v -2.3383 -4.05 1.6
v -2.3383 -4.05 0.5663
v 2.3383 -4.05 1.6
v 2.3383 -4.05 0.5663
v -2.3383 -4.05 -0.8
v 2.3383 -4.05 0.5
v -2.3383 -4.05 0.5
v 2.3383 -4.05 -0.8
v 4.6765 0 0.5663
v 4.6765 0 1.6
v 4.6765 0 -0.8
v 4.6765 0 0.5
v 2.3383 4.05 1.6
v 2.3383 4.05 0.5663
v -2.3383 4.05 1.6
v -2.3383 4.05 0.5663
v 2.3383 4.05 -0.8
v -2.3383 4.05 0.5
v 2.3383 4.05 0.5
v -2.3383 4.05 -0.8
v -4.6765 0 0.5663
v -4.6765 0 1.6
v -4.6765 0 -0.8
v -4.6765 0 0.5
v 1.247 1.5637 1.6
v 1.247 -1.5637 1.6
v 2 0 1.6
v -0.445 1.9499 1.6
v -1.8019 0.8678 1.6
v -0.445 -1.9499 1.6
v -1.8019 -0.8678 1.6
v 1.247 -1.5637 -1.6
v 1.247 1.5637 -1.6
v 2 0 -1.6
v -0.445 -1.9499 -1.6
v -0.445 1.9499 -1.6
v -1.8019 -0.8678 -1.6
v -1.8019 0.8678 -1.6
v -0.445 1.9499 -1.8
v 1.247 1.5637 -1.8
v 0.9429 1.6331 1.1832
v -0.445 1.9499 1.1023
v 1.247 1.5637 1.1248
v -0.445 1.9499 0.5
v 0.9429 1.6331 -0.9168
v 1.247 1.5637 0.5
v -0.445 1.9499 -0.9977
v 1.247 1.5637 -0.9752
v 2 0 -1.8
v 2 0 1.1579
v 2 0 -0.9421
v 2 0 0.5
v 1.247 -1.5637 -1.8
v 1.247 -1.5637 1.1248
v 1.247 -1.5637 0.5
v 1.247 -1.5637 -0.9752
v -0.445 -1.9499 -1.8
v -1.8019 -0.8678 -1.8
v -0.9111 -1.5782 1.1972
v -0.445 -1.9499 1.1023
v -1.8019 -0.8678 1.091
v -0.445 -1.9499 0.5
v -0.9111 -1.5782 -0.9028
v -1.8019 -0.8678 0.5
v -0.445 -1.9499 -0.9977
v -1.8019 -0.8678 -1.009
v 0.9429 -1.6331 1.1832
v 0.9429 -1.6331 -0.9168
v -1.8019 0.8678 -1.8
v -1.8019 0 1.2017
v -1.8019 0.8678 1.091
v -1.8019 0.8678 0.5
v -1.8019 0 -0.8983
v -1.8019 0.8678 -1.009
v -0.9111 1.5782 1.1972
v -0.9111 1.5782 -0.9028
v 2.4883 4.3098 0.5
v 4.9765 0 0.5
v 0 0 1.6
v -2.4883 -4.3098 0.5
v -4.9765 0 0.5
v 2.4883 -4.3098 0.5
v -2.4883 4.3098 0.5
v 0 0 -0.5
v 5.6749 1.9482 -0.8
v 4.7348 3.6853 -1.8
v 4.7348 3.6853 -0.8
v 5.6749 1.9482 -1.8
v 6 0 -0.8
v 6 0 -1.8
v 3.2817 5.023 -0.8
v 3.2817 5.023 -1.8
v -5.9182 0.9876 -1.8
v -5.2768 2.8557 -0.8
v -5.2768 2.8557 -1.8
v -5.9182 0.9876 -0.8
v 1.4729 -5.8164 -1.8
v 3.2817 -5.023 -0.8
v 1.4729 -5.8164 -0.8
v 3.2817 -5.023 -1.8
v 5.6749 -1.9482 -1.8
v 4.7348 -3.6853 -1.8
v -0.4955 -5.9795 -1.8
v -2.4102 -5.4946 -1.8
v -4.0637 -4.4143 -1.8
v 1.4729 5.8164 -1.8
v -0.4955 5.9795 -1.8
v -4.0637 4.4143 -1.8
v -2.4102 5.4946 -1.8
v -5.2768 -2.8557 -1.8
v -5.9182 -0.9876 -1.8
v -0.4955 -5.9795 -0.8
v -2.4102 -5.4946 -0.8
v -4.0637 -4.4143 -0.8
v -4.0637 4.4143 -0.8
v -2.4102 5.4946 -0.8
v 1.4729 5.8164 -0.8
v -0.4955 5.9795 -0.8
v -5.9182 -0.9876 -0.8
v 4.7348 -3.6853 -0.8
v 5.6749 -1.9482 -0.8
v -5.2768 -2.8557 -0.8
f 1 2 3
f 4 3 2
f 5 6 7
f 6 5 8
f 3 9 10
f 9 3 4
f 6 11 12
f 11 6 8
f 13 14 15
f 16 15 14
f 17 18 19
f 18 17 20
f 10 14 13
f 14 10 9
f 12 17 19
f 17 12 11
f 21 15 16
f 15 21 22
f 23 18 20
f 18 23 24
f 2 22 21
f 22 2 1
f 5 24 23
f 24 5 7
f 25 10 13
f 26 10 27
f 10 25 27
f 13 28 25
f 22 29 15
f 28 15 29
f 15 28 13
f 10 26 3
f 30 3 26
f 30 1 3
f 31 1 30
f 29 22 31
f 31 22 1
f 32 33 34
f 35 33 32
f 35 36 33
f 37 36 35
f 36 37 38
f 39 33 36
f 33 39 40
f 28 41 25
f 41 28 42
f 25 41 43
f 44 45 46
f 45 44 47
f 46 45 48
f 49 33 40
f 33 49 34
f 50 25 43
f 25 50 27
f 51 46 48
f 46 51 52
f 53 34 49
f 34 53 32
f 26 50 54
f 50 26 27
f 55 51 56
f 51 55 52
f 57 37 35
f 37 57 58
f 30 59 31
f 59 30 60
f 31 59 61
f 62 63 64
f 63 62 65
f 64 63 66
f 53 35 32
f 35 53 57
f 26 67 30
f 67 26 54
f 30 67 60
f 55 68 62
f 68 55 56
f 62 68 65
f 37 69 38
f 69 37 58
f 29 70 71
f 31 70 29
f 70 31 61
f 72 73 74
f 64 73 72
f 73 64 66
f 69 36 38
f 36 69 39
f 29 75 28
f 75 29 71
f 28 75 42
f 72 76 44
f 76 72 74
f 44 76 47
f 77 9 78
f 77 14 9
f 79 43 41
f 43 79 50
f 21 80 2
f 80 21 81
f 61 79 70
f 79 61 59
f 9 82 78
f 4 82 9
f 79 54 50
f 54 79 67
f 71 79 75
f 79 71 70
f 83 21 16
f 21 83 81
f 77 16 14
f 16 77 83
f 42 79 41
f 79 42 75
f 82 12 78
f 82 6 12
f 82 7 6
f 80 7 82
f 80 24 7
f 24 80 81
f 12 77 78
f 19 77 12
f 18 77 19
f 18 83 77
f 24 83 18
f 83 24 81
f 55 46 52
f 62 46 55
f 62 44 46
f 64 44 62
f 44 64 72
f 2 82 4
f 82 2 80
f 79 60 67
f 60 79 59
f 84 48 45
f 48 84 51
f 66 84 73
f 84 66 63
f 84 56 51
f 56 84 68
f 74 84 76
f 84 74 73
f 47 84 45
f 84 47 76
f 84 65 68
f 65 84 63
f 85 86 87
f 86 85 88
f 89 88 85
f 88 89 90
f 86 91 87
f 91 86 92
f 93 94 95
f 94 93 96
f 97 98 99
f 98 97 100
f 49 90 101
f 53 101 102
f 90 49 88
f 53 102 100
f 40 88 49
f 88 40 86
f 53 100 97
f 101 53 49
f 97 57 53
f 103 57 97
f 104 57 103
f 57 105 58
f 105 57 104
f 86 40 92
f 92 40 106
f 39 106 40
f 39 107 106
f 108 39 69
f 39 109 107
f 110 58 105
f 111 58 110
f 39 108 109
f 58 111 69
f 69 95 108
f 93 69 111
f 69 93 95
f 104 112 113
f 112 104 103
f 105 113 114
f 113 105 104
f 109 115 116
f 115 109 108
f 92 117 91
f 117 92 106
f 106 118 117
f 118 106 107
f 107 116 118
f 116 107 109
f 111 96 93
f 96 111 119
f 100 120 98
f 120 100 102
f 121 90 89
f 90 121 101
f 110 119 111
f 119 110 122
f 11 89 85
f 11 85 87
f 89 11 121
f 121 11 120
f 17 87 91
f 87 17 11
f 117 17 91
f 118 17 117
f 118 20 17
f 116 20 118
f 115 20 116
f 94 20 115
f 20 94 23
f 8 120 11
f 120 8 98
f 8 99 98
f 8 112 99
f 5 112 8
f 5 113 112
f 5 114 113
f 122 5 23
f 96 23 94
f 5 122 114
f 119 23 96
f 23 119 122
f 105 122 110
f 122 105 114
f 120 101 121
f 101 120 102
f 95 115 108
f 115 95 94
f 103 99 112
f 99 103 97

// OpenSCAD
// Parameters
thread_nominal_diameter_mm = 4; //[2:8:0.1]
across_flats_mm = 8.1; //[4.05:16.2:0.1]
thickness_mm = 3.2; //[1.6:6.4:0.1]
hole_diameter_mm = 4; //[2:6:0.05]
chamfer_mm = 0.3; //[0:1.2:0.05]
corner_radius_mm = 0; //[0:1:0.05]
tolerance_mm = 0; //[-0.2:0.4:0.01]
overlap_mm = 0.8; //[0.2:2:0.1]
washer_outer_diameter_mm = 12; //[6:24:0.1]
washer_thickness_mm = 1; //[0.5:2:0.05]

// Hex Nut with Washer
module nut_and_washer() {
  color("DimGray") {
    // Hex Nut Body
    difference() {
      cylinder(h=thickness_mm, r=(across_flats_mm + tolerance_mm) / (2 * cos(30)), center=true, $fn=6);
      // Central Through Hole
      cylinder(h=thickness_mm + 2*overlap_mm, r=(hole_diameter_mm + tolerance_mm) / 2, center=true);
    }
    // Top and Bottom Chamfers
    difference() {
      union() {
        translate([0, 0, thickness_mm/2 - (chamfer_mm + overlap_mm)/2])
          cylinder(h=chamfer_mm + overlap_mm, r1=(across_flats_mm + tolerance_mm) / (2 * cos(30)) + chamfer_mm, r2=0, center=true, $fn=6);
        translate([0, 0, -thickness_mm/2 + (chamfer_mm + overlap_mm)/2])
          cylinder(h=chamfer_mm + overlap_mm, r1=(across_flats_mm + tolerance_mm) / (2 * cos(30)) + chamfer_mm, r2=0, center=true, $fn=6);
      }
    }
  }
  
  // Washer
  color("Silver") {
    difference() {
      translate([0, 0, -thickness_mm/2 - washer_thickness_mm/2 + overlap_mm])
        cylinder(h=washer_thickness_mm, r=washer_outer_diameter_mm/2, center=true);
      translate([0, 0, -thickness_mm/2 - washer_thickness_mm/2 + overlap_mm])
        cylinder(h=washer_thickness_mm + 2*overlap_mm, r=(hole_diameter_mm + tolerance_mm) / 2, center=true);
    }
  }
}

// Assembly
module assembly() {
  nut_and_washer();
}

assembly();
